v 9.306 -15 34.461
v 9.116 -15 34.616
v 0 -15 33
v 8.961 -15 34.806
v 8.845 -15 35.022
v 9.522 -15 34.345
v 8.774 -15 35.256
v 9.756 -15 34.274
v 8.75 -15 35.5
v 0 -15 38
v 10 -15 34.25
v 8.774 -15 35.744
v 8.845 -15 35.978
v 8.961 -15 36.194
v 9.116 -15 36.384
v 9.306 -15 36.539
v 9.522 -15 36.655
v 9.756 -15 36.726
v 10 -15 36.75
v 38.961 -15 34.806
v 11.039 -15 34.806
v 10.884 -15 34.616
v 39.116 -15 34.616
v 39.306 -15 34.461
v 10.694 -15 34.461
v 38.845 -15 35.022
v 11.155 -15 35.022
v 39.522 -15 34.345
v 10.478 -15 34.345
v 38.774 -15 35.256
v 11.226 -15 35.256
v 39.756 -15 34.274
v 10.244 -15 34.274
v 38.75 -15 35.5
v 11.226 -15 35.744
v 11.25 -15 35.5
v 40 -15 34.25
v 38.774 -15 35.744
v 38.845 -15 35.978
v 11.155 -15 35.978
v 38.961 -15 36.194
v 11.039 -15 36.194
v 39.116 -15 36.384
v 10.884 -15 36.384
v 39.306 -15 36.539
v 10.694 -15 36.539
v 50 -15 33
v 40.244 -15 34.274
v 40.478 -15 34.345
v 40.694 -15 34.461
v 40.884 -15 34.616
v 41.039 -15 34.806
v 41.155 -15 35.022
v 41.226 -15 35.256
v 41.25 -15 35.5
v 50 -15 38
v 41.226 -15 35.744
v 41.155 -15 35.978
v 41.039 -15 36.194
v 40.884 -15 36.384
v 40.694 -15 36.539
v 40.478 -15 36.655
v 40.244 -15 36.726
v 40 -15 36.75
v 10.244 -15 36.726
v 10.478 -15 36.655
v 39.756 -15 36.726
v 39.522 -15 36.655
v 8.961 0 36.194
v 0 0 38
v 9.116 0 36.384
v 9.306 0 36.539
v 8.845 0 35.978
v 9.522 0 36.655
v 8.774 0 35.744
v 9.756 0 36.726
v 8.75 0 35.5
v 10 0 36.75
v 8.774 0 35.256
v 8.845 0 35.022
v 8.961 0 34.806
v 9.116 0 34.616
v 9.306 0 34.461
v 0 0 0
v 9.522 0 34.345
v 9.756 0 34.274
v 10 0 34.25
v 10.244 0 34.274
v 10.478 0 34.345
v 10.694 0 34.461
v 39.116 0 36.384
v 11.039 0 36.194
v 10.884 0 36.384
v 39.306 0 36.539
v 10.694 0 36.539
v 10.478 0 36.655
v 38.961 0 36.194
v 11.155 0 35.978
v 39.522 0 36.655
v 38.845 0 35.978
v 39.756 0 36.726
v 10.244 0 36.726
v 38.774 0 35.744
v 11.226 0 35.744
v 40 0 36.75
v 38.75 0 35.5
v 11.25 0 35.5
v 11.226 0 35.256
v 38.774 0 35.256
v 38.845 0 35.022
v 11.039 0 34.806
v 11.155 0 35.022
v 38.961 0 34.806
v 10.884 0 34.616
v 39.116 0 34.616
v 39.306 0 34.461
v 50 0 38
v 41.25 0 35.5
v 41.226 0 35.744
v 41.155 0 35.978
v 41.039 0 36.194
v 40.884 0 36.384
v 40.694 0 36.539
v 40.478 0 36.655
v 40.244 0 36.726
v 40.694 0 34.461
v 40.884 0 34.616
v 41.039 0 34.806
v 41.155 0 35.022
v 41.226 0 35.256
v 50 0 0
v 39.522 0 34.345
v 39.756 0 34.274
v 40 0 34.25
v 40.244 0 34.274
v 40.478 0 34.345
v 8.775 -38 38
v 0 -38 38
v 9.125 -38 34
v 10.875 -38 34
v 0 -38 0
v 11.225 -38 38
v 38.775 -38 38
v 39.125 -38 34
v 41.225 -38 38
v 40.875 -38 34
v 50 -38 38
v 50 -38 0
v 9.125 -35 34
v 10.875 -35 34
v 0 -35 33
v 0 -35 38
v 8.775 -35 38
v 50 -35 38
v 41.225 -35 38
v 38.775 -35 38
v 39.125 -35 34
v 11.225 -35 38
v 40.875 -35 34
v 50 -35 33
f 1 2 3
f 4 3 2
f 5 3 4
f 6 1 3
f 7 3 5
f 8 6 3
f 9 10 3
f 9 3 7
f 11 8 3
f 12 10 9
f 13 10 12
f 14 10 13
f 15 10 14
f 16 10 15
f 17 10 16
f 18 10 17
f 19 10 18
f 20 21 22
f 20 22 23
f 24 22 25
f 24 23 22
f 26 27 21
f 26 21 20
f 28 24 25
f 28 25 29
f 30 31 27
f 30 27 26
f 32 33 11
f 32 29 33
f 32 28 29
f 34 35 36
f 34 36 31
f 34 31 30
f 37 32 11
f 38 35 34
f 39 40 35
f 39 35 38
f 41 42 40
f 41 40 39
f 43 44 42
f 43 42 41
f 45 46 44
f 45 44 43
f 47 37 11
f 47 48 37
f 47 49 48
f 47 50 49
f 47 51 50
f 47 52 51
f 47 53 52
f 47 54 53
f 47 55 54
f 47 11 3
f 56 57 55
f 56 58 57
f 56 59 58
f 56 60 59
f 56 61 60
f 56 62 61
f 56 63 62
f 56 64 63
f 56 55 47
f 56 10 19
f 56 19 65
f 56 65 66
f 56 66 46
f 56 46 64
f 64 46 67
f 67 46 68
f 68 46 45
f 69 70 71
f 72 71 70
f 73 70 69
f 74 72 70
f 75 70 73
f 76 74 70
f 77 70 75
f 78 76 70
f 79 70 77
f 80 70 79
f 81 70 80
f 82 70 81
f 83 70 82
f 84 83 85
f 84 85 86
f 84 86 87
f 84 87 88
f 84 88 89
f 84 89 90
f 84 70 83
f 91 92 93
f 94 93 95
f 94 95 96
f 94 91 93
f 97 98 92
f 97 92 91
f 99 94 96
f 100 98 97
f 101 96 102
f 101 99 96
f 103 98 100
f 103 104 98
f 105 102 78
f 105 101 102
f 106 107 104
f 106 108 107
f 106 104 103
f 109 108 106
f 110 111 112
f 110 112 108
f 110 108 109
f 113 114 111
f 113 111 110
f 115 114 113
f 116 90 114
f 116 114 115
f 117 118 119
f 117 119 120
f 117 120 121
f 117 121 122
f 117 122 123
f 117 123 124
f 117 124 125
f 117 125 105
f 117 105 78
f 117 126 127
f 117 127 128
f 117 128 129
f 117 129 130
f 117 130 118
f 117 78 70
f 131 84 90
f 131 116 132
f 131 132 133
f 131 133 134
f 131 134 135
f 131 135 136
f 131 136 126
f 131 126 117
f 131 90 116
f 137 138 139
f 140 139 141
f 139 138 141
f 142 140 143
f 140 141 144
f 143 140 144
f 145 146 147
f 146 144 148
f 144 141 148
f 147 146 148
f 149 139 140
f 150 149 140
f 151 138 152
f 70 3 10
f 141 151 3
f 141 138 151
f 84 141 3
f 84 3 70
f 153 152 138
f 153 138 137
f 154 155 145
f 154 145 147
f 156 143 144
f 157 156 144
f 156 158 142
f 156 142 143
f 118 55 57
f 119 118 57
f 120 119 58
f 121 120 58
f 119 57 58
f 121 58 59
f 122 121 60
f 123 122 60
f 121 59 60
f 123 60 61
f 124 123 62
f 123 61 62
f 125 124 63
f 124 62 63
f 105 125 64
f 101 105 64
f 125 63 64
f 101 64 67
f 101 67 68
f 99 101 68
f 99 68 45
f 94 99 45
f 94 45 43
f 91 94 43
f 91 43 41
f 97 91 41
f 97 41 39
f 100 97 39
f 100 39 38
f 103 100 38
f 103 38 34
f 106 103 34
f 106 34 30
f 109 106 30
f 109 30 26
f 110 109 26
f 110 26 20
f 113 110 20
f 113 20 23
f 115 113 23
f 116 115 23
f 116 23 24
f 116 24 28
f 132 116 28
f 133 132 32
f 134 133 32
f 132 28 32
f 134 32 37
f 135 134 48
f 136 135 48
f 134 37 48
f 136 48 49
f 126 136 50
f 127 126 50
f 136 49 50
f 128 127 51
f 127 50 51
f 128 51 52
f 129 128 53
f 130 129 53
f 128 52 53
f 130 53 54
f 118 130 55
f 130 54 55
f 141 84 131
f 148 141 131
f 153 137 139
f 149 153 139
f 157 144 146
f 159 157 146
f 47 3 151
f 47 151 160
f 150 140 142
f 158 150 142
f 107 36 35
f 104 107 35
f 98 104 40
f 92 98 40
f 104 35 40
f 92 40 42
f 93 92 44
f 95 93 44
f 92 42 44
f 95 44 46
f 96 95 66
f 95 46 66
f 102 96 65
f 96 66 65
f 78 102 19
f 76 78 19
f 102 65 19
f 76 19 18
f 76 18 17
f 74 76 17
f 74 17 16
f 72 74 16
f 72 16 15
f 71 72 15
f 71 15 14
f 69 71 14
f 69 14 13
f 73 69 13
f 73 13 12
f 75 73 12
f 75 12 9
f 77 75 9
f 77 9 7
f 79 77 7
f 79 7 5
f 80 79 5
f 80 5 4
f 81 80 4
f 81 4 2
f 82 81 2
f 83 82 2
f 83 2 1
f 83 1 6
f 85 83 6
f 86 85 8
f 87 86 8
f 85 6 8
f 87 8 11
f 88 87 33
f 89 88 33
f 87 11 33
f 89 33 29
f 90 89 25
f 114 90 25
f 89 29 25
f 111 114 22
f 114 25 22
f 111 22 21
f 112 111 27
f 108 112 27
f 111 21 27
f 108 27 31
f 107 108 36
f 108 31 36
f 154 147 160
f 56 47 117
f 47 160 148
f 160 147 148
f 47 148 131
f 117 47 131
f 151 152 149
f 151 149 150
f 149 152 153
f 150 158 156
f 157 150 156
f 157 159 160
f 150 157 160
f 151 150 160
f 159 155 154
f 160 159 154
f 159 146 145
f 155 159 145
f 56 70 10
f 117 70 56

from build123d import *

# Parameters (mm, degrees)
F0_W     = 50
F0_H     = 38
F1_DEPTH = 38
F2_W     = 50
F2_H     = 20
F3_DEPTH = 5
F4_R     = 1.25
F5_DEPTH = 25
F7_DEPTH = 5


with BuildPart() as f1:
    # F0 (on Top) → F1 (new body)
    with BuildSketch(Plane.XY):
        with Locations((25, -19)):
            Rectangle(F0_W, F0_H)
    extrude(amount=F1_DEPTH)

    # F2 (on face) → F3 (cut)
    with BuildSketch(Plane.XY.offset(38)):
        with Locations((25, -25)):
            Rectangle(F2_W, F2_H)
    extrude(amount=-F3_DEPTH, mode=Mode.SUBTRACT)

    # F4 (on face) → F5 (cut)
    with BuildSketch(Plane.XZ.offset(15)):
        with Locations((10, 35.5)):
            Circle(F4_R)
        with Locations((40, 35.5)):
            Circle(F4_R)
    extrude(amount=-F5_DEPTH, mode=Mode.SUBTRACT)

    # F6 (on face) → F7 (cut)
    with BuildSketch(Plane.XZ.offset(38)):
        Polygon((11.224955, 38), (8.775045, 38), (9.125, 34), (10.875, 34), align=None)
        Polygon((41.224955, 38), (38.775045, 38), (39.125, 34), (40.875, 34), align=None)
    extrude(amount=-F7_DEPTH, mode=Mode.SUBTRACT)


solid = f1.part
